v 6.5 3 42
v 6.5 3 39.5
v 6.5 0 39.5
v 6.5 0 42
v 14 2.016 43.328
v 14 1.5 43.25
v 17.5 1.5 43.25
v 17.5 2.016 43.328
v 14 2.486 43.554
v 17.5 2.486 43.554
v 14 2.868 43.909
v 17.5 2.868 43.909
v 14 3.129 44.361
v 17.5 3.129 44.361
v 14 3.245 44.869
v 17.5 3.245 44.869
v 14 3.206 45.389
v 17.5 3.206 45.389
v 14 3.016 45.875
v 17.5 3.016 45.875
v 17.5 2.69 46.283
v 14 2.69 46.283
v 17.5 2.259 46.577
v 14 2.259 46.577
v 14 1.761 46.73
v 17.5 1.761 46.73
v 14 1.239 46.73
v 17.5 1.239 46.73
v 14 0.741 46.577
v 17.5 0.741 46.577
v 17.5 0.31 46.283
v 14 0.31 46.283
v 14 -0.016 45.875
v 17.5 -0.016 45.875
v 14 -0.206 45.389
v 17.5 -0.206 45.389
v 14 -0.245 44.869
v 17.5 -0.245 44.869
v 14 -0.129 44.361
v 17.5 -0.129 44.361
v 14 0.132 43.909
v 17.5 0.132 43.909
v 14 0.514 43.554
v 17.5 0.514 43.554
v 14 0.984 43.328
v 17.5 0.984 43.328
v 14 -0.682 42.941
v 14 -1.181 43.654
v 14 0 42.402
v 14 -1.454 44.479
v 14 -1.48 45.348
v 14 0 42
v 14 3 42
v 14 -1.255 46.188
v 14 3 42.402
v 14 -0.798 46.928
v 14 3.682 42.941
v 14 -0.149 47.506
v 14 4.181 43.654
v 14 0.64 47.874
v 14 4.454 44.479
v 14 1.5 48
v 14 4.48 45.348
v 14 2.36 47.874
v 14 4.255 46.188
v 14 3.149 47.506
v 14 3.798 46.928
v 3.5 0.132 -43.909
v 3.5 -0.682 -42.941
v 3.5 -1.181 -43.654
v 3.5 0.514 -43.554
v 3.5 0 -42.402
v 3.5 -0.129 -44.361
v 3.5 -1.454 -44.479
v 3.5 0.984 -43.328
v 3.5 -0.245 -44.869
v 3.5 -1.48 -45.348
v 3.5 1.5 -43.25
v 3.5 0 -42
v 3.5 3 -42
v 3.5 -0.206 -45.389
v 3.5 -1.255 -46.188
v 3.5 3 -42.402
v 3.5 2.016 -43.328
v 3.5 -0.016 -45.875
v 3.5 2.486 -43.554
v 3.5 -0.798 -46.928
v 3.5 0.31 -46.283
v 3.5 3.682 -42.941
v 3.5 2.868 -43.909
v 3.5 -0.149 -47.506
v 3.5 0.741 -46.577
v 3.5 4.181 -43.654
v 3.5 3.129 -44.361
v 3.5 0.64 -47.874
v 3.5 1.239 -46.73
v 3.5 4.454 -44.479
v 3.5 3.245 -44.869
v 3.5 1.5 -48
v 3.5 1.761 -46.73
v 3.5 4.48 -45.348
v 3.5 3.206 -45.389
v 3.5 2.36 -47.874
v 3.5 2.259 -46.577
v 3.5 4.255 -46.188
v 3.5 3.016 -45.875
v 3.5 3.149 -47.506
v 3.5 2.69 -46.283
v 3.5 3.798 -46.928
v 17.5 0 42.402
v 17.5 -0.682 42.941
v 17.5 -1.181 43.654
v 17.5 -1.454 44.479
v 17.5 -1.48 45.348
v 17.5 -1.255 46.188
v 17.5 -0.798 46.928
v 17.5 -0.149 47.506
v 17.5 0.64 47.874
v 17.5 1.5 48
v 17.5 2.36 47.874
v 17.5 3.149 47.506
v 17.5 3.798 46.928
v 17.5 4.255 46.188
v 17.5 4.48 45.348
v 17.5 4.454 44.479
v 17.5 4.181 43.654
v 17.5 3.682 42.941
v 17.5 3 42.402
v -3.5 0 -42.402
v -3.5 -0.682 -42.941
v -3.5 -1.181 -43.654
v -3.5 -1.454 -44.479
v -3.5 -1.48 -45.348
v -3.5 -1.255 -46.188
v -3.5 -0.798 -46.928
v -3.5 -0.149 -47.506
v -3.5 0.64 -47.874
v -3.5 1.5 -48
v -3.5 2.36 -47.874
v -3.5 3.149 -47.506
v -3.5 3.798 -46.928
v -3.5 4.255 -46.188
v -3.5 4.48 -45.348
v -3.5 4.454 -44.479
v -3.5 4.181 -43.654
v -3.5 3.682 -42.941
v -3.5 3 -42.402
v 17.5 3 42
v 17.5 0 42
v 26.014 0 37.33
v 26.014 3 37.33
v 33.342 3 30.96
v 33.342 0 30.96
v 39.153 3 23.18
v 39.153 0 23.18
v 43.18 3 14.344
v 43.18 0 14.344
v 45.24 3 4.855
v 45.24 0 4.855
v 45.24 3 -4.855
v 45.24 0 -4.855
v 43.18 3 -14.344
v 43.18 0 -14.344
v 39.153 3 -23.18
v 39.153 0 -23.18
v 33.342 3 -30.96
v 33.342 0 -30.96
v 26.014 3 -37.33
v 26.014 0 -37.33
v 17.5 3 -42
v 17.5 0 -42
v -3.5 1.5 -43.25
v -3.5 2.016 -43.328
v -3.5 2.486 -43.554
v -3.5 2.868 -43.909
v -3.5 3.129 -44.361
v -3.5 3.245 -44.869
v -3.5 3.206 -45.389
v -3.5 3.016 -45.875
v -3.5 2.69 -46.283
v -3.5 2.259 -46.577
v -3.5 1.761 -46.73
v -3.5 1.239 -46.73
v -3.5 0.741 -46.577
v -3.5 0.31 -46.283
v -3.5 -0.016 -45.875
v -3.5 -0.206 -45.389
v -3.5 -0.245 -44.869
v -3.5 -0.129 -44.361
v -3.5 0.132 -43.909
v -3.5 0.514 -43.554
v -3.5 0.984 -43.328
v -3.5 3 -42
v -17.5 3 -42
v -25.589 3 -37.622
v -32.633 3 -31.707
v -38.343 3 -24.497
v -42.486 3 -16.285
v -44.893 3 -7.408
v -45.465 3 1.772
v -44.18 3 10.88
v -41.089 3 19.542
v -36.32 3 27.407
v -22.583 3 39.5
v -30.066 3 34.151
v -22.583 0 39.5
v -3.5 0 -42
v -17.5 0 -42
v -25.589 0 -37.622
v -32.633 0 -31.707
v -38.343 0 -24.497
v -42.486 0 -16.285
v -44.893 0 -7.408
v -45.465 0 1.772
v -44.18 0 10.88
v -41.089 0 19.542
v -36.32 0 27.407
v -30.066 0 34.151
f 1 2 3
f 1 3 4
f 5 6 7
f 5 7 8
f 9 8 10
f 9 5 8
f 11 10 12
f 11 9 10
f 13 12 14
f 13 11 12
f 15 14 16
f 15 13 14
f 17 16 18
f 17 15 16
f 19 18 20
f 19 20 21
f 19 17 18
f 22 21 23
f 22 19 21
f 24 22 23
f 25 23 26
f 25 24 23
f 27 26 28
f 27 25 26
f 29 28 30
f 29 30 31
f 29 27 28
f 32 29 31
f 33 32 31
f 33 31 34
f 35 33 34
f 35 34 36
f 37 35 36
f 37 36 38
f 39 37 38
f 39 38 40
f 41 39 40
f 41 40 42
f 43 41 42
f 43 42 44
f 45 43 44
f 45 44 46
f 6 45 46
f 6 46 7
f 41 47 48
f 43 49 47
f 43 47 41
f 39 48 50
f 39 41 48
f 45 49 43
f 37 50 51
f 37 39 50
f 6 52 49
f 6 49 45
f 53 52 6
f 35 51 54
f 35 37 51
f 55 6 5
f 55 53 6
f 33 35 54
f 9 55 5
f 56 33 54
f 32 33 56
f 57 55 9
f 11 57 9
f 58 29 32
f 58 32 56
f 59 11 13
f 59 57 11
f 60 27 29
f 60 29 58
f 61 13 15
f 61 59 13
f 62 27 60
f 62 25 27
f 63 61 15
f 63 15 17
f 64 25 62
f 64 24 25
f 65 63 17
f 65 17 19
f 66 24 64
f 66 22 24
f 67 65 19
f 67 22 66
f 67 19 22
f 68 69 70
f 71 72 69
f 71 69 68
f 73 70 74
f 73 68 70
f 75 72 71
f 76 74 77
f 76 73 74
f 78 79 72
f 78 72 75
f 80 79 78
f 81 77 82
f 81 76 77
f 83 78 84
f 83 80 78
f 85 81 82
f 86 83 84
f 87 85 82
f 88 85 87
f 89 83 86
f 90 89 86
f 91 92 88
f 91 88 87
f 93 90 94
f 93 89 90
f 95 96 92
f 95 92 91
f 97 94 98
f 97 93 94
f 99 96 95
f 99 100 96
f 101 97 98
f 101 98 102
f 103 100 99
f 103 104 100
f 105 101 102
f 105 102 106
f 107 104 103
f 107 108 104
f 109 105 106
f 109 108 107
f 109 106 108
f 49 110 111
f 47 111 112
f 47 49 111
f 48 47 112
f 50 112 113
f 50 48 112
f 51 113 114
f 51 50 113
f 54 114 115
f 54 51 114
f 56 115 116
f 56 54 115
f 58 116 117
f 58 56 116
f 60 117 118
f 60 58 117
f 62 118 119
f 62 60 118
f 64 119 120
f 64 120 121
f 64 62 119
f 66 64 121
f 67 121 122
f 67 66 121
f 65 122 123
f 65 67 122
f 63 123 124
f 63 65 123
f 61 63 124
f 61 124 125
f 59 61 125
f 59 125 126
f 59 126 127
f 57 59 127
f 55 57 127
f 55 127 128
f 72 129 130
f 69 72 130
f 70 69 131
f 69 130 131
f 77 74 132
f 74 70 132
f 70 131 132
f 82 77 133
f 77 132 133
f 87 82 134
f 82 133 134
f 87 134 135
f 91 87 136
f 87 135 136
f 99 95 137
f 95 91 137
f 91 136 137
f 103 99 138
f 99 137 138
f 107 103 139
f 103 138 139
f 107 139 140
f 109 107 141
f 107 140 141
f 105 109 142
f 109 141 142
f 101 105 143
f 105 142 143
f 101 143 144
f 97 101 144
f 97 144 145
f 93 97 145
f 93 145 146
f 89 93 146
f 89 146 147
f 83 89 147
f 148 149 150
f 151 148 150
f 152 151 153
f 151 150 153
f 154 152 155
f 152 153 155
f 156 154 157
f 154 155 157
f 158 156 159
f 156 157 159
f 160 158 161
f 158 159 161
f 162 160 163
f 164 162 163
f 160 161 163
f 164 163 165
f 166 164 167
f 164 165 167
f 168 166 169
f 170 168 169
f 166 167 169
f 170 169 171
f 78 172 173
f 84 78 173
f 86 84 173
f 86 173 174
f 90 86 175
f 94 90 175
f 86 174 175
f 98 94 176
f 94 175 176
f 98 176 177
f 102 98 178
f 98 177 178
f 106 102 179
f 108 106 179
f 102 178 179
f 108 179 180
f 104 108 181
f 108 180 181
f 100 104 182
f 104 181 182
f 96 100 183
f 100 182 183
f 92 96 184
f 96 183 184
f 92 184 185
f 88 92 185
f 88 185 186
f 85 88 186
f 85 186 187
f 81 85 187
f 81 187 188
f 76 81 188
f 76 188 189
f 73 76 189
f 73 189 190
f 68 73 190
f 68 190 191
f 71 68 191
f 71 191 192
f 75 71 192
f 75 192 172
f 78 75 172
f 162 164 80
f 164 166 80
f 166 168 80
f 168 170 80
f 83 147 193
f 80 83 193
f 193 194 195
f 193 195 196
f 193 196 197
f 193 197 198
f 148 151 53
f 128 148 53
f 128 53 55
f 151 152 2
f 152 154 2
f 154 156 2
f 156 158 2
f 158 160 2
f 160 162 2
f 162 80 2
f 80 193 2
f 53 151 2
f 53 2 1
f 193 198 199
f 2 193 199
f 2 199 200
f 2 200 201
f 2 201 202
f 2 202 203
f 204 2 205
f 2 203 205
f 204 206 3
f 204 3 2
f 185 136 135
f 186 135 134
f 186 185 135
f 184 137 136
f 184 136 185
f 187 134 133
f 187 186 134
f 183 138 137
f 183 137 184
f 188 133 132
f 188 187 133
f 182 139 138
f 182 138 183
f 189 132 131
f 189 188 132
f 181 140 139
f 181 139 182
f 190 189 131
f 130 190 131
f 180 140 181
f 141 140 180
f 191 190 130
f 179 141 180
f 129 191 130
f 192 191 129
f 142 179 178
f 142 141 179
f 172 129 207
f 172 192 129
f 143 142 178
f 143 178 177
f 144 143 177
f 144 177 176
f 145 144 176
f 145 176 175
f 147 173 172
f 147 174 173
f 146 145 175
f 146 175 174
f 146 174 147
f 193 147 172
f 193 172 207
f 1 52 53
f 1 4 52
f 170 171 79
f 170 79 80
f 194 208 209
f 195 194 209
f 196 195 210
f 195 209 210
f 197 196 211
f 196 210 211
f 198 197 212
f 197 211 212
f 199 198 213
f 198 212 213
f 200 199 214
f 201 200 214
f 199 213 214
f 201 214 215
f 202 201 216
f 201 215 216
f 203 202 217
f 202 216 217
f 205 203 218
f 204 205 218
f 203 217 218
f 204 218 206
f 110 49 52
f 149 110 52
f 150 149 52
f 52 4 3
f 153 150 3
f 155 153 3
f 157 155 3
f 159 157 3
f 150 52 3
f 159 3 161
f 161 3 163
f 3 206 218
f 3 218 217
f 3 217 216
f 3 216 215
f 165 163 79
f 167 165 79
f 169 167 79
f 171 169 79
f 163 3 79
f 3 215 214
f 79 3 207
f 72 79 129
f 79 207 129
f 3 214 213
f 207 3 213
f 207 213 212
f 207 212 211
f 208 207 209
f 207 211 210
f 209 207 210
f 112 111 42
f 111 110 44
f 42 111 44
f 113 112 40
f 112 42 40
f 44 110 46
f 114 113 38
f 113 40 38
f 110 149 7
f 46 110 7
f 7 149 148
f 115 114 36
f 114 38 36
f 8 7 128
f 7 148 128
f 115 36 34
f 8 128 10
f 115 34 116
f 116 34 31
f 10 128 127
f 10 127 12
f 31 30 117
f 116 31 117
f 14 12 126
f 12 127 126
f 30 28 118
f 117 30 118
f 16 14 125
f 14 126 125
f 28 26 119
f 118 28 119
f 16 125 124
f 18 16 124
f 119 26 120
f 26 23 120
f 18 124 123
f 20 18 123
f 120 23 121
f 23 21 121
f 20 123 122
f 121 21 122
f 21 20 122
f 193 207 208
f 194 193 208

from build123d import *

# Parameters (mm, degrees)
BOSS_EXTRUDE1_DEPTH     = 3
BOSS_EXTRUDE2_START     = -10
SKETCH2_R               = 1.75
BOSS_EXTRUDE2_DEPTH     = 27.5
SKETCH3_W               = 8
SKETCH3_H               = 9
CUT_EXTRUDE1_DEPTH      = 24
SKETCH4_W               = 8
SKETCH4_H               = 9
CUT_EXTRUDE2_DEPTH      = 6.5
SKETCH5_W               = 7
SKETCH5_H               = 7
CUT_EXTRUDE3_DEPTH      = 14
CUT_EXTRUDE4_REACH      = 72.91
CUT_EXTRUDE4_END_RADIUS = 45.5
SKETCH6_W               = 11
SKETCH6_H               = 12


with BuildPart() as part:
    # Sketch1 → Boss-Extrude1 (new body)
    with BuildSketch(Plane(origin=(0, 0, 0), x_dir=(1, 0, 0), z_dir=(0, 1, 0))):
        with BuildLine():
            Line((-17.5, -42), (17.5, -42))
            ThreePointArc((17.5, -42), (45.5, 0), (17.5, 42))
            Line((17.5, 42), (-17.5, 42))
            ThreePointArc((-17.5, 42), (-45.5, 0), (-17.5, -42))
        make_face()
    extrude(amount=BOSS_EXTRUDE1_DEPTH)

    # Sketch2 → Boss-Extrude2 (add)
    with BuildSketch(Plane(origin=(0, 0, 0), x_dir=(0, 0, -1), z_dir=(1, 0, 0)).offset(BOSS_EXTRUDE2_START)):
        with BuildLine():
            Line((-42, 0), (-42.401923789, 0))
            ThreePointArc((-42.401923789, 0), (-48, 1.5), (-42.401923789, 3))
            Line((-42.401923789, 3), (-42, 3))
            Line((-42, 3), (-42, 1.5))
            Line((-42, 1.5), (-42, 0))
        make_face()
        with Locations((-45, 1.5)):
            Circle(SKETCH2_R, mode=Mode.SUBTRACT)
    boss_extrude2 = extrude(amount=BOSS_EXTRUDE2_DEPTH)

    # Mirror1: Boss-Extrude2 across plane
    add(boss_extrude2.mirror(Plane.XY))

    # Sketch3 → Cut-Extrude1 (cut)
    with BuildSketch(Plane.ZY.offset(10)):
        with Locations((46, 2)):
            Rectangle(SKETCH3_W, SKETCH3_H)
    extrude(amount=-CUT_EXTRUDE1_DEPTH, mode=Mode.SUBTRACT)

    # Sketch4 → Cut-Extrude2 (cut)
    with BuildSketch(Plane.ZY.offset(10)):
        with Locations((-46, 2)):
            Rectangle(SKETCH4_W, SKETCH4_H)
    extrude(amount=-CUT_EXTRUDE2_DEPTH, mode=Mode.SUBTRACT)

    # Sketch5 → Cut-Extrude3 (cut)
    with BuildSketch(Plane(origin=(17.5, 0, 0), x_dir=(0, 0, -1), z_dir=(1, 0, 0))):
        with Locations((45.5, 1.589580261)):
            Rectangle(SKETCH5_W, SKETCH5_H)
    extrude(amount=-CUT_EXTRUDE3_DEPTH, mode=Mode.SUBTRACT)

    # Cut-Extrude4: up to this cylinder (the profile starts inside it)
    cut_extrude4_end = Plane(origin=(0, 1.5, 0), z_dir=(0, -1, 0)) * Cylinder(CUT_EXTRUDE4_END_RADIUS, 237.82, mode=Mode.PRIVATE)
    # Sketch6 → Cut-Extrude4 (cut, up to the surface)
    with BuildSketch(Plane.ZY.offset(-6.5), mode=Mode.PRIVATE) as cut_extrude4_sk1:
        with Locations((45, 1.5)):
            Rectangle(SKETCH6_W, SKETCH6_H)
    cut_extrude4_tool1 = extrude(cut_extrude4_sk1.sketch, amount=CUT_EXTRUDE4_REACH, mode=Mode.PRIVATE) & cut_extrude4_end
    add(cut_extrude4_tool1.solids().sort_by_distance((6.5, 1.5, 45))[0], mode=Mode.SUBTRACT)


solid = part.part
